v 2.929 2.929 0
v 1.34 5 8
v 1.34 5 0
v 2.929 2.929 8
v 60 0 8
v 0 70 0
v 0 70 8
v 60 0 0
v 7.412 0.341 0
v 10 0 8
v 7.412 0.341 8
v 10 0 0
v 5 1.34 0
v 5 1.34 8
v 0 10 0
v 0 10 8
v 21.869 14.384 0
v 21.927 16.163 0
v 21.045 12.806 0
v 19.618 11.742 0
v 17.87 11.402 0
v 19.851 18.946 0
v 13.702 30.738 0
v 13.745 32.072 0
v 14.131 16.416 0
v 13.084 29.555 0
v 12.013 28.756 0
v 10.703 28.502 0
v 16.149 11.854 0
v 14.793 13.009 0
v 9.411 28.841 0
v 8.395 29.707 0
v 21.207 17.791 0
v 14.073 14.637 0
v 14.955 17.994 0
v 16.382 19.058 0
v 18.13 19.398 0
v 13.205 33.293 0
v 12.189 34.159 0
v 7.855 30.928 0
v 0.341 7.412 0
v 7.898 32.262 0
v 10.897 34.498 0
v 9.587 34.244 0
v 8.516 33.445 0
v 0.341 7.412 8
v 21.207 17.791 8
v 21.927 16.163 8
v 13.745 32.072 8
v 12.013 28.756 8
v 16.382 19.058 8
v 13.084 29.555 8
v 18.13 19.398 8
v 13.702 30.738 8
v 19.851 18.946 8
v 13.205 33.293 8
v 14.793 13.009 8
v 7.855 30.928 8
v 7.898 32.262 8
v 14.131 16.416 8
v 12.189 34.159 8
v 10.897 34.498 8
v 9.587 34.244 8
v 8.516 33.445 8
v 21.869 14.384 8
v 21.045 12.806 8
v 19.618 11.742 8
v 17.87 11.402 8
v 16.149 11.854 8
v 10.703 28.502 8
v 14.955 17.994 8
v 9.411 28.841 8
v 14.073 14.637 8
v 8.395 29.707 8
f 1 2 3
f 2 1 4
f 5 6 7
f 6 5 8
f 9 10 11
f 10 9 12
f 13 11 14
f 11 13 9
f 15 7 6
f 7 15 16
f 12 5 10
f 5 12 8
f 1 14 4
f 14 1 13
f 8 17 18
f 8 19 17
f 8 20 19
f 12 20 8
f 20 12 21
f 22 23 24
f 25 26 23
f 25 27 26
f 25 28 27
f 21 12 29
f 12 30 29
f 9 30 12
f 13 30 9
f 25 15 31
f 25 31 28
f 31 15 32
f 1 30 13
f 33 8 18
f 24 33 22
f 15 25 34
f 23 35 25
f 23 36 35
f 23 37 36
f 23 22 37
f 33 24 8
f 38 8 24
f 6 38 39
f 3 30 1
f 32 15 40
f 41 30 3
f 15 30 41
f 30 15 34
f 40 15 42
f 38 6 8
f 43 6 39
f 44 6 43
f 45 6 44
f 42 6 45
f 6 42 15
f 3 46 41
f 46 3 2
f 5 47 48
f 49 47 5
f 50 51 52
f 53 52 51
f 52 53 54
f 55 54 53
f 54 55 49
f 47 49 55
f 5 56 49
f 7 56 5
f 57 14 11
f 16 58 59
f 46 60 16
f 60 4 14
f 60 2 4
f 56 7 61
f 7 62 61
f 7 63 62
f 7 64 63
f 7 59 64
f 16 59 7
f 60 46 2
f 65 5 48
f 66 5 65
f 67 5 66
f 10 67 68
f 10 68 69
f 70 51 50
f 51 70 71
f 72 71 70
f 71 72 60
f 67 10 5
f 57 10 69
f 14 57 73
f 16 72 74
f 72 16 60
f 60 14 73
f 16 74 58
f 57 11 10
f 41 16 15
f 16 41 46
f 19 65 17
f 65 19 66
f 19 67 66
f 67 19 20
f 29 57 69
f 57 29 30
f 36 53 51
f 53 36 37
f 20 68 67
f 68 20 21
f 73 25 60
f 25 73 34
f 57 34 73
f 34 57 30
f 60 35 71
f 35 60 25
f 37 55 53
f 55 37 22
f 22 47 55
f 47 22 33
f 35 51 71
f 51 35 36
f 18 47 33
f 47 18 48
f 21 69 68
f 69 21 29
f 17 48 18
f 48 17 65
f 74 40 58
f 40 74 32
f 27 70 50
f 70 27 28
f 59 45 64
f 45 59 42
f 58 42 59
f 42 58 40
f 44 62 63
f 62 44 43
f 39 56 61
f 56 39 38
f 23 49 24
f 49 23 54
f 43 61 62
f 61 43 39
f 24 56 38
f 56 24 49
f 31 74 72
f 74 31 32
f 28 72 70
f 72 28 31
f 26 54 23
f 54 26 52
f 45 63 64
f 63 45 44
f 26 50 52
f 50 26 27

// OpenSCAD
$fn = 32;

// ----------------------------------------------------------------------
// Bracket plate: corner pad 60 x 70, fillet R10
// ----------------------------------------------------------------------

// --- parameters (mm) ---
hole_r = 3;               // bolt hole radius
plate_t = 8;              // plate thickness, Z (extrusion height)
leg_a = 60;               // base leg
leg_b = 70;               // height leg
fillet_r = 10;            // right-angle fillet radius

hole_d1 = 2 * hole_r + 2;
hole_d2 = 2 * hole_r;

profile = [[10, 0], [60, 0], [0, 70], [0, 10], [0.341, 7.412], [1.34, 5], [2.929, 2.929], [5, 1.34], [7.412, 0.341]];  // primary outline, 9 points, counter clockwise
void_1 = [[21.927, 16.163], [21.207, 17.791], [19.851, 18.946], [18.13, 19.398], [16.382, 19.058], [14.955, 17.994], [14.131, 16.416], [14.073, 14.637], [14.793, 13.009], [16.149, 11.854], [17.87, 11.402], [19.618, 11.742], [21.045, 12.806], [21.869, 14.384]];  // mount hole 1, 14 points
void_2 = [[13.745, 32.072], [13.205, 33.293], [12.189, 34.159], [10.897, 34.498], [9.587, 34.244], [8.516, 33.445], [7.898, 32.262], [7.855, 30.928], [8.395, 29.707], [9.411, 28.841], [10.703, 28.502], [12.013, 28.756], [13.084, 29.555], [13.702, 30.738]];  // mount hole 2, 14 points

// --- the one profile operation ---
difference() {
  linear_extrude(height = plate_t) polygon(points = profile);
  translate([0, 0, -1])
    linear_extrude(height = plate_t + 2) polygon(points = void_1);
  translate([0, 0, -1])
    linear_extrude(height = plate_t + 2) polygon(points = void_2);
}
